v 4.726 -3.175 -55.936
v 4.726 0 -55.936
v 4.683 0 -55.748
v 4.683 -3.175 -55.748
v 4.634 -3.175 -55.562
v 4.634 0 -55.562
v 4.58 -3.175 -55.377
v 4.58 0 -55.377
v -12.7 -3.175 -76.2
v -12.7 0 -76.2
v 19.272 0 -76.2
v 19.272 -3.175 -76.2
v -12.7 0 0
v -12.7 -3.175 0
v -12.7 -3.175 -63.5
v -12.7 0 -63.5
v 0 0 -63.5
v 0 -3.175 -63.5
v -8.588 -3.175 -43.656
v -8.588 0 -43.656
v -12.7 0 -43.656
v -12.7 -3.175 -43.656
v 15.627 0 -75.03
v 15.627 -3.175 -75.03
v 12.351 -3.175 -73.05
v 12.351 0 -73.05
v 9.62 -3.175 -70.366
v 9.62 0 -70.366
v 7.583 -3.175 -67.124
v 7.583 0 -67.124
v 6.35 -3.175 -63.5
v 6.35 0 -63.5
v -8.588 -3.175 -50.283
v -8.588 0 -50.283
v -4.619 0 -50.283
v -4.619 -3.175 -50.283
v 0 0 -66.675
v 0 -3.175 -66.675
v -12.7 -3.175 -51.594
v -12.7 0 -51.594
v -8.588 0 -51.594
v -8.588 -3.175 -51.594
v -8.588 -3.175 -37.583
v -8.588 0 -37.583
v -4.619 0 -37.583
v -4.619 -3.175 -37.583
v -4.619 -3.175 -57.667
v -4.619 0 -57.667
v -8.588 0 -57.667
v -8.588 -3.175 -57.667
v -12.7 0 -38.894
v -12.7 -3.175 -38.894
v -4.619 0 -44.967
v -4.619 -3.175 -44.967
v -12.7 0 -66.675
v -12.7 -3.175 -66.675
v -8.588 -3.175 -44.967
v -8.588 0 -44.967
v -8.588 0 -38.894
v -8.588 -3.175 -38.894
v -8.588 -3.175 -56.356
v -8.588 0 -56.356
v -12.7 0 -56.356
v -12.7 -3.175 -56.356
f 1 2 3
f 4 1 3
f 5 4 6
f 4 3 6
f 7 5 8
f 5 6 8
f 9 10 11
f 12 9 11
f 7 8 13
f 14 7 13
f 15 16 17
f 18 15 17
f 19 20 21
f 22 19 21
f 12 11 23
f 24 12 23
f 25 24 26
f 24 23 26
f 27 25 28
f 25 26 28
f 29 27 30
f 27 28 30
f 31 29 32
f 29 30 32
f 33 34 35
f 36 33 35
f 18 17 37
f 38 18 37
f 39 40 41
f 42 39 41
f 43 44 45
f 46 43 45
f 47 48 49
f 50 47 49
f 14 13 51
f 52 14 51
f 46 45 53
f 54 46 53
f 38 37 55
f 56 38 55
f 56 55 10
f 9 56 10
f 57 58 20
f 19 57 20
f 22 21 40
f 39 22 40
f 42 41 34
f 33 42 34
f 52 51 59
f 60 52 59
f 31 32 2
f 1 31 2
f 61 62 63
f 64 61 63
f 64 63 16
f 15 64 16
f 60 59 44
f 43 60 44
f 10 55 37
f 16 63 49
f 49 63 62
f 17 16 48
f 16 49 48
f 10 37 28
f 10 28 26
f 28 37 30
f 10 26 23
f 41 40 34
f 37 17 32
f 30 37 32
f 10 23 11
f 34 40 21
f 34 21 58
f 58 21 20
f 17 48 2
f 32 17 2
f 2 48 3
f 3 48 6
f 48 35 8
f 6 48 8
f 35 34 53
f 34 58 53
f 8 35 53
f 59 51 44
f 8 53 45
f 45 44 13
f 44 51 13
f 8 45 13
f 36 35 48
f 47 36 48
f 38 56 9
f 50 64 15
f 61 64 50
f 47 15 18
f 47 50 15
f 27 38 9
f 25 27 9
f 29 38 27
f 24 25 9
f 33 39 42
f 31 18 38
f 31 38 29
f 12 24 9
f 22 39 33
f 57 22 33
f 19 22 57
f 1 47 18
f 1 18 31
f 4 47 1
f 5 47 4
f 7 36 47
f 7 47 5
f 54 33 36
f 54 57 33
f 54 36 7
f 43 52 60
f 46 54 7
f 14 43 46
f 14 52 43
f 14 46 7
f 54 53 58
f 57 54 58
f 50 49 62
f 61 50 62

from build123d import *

# Parameters (mm, degrees)
F1_DEPTH = 3.175


with BuildPart() as f1:
    # F0 (on Front) → F1 (new body)
    with BuildSketch(Plane.XZ):
        with BuildLine():
            ThreePointArc((19.272455, -76.2), (10.907118, -71.787462), (6.35, -63.5))
            Line((6.35, -63.5), (4.726481, -55.935776))
            ThreePointArc((4.726481, -55.935776), (4.659413, -55.65464), (4.579622, -55.376848))
            Line((4.579622, -55.376848), (-12.7, 0))
            Line((-12.7, 0), (-12.7, -38.89375))
            Line((-12.7, -38.89375), (-8.587963, -38.89375))
            Line((-8.587963, -38.89375), (-8.587963, -37.58333))
            Line((-8.587963, -37.58333), (-4.619213, -37.58333))
            Line((-4.619213, -37.58333), (-4.619213, -44.96667))
            Line((-4.619213, -44.96667), (-8.587963, -44.96667))
            Line((-8.587963, -44.96667), (-8.587963, -43.65625))
            Line((-8.587963, -43.65625), (-12.7, -43.65625))
            Line((-12.7, -43.65625), (-12.7, -51.59375))
            Line((-12.7, -51.59375), (-8.587963, -51.59375))
            Line((-8.587963, -51.59375), (-8.587963, -50.28333))
            Line((-8.587963, -50.28333), (-4.619213, -50.28333))
            Line((-4.619213, -50.28333), (-4.619213, -57.66667))
            Line((-4.619213, -57.66667), (-8.587963, -57.66667))
            Line((-8.587963, -57.66667), (-8.587963, -56.35625))
            Line((-8.587963, -56.35625), (-12.7, -56.35625))
            Line((-12.7, -56.35625), (-12.7, -63.5))
            Line((-12.7, -63.5), (0, -63.5))
            Line((0, -63.5), (0, -66.675))
            Line((0, -66.675), (-12.7, -66.675))
            Line((-12.7, -66.675), (-12.7, -76.2))
            Line((-12.7, -76.2), (19.272455, -76.2))
        make_face()
    extrude(amount=F1_DEPTH)


solid = f1.part
